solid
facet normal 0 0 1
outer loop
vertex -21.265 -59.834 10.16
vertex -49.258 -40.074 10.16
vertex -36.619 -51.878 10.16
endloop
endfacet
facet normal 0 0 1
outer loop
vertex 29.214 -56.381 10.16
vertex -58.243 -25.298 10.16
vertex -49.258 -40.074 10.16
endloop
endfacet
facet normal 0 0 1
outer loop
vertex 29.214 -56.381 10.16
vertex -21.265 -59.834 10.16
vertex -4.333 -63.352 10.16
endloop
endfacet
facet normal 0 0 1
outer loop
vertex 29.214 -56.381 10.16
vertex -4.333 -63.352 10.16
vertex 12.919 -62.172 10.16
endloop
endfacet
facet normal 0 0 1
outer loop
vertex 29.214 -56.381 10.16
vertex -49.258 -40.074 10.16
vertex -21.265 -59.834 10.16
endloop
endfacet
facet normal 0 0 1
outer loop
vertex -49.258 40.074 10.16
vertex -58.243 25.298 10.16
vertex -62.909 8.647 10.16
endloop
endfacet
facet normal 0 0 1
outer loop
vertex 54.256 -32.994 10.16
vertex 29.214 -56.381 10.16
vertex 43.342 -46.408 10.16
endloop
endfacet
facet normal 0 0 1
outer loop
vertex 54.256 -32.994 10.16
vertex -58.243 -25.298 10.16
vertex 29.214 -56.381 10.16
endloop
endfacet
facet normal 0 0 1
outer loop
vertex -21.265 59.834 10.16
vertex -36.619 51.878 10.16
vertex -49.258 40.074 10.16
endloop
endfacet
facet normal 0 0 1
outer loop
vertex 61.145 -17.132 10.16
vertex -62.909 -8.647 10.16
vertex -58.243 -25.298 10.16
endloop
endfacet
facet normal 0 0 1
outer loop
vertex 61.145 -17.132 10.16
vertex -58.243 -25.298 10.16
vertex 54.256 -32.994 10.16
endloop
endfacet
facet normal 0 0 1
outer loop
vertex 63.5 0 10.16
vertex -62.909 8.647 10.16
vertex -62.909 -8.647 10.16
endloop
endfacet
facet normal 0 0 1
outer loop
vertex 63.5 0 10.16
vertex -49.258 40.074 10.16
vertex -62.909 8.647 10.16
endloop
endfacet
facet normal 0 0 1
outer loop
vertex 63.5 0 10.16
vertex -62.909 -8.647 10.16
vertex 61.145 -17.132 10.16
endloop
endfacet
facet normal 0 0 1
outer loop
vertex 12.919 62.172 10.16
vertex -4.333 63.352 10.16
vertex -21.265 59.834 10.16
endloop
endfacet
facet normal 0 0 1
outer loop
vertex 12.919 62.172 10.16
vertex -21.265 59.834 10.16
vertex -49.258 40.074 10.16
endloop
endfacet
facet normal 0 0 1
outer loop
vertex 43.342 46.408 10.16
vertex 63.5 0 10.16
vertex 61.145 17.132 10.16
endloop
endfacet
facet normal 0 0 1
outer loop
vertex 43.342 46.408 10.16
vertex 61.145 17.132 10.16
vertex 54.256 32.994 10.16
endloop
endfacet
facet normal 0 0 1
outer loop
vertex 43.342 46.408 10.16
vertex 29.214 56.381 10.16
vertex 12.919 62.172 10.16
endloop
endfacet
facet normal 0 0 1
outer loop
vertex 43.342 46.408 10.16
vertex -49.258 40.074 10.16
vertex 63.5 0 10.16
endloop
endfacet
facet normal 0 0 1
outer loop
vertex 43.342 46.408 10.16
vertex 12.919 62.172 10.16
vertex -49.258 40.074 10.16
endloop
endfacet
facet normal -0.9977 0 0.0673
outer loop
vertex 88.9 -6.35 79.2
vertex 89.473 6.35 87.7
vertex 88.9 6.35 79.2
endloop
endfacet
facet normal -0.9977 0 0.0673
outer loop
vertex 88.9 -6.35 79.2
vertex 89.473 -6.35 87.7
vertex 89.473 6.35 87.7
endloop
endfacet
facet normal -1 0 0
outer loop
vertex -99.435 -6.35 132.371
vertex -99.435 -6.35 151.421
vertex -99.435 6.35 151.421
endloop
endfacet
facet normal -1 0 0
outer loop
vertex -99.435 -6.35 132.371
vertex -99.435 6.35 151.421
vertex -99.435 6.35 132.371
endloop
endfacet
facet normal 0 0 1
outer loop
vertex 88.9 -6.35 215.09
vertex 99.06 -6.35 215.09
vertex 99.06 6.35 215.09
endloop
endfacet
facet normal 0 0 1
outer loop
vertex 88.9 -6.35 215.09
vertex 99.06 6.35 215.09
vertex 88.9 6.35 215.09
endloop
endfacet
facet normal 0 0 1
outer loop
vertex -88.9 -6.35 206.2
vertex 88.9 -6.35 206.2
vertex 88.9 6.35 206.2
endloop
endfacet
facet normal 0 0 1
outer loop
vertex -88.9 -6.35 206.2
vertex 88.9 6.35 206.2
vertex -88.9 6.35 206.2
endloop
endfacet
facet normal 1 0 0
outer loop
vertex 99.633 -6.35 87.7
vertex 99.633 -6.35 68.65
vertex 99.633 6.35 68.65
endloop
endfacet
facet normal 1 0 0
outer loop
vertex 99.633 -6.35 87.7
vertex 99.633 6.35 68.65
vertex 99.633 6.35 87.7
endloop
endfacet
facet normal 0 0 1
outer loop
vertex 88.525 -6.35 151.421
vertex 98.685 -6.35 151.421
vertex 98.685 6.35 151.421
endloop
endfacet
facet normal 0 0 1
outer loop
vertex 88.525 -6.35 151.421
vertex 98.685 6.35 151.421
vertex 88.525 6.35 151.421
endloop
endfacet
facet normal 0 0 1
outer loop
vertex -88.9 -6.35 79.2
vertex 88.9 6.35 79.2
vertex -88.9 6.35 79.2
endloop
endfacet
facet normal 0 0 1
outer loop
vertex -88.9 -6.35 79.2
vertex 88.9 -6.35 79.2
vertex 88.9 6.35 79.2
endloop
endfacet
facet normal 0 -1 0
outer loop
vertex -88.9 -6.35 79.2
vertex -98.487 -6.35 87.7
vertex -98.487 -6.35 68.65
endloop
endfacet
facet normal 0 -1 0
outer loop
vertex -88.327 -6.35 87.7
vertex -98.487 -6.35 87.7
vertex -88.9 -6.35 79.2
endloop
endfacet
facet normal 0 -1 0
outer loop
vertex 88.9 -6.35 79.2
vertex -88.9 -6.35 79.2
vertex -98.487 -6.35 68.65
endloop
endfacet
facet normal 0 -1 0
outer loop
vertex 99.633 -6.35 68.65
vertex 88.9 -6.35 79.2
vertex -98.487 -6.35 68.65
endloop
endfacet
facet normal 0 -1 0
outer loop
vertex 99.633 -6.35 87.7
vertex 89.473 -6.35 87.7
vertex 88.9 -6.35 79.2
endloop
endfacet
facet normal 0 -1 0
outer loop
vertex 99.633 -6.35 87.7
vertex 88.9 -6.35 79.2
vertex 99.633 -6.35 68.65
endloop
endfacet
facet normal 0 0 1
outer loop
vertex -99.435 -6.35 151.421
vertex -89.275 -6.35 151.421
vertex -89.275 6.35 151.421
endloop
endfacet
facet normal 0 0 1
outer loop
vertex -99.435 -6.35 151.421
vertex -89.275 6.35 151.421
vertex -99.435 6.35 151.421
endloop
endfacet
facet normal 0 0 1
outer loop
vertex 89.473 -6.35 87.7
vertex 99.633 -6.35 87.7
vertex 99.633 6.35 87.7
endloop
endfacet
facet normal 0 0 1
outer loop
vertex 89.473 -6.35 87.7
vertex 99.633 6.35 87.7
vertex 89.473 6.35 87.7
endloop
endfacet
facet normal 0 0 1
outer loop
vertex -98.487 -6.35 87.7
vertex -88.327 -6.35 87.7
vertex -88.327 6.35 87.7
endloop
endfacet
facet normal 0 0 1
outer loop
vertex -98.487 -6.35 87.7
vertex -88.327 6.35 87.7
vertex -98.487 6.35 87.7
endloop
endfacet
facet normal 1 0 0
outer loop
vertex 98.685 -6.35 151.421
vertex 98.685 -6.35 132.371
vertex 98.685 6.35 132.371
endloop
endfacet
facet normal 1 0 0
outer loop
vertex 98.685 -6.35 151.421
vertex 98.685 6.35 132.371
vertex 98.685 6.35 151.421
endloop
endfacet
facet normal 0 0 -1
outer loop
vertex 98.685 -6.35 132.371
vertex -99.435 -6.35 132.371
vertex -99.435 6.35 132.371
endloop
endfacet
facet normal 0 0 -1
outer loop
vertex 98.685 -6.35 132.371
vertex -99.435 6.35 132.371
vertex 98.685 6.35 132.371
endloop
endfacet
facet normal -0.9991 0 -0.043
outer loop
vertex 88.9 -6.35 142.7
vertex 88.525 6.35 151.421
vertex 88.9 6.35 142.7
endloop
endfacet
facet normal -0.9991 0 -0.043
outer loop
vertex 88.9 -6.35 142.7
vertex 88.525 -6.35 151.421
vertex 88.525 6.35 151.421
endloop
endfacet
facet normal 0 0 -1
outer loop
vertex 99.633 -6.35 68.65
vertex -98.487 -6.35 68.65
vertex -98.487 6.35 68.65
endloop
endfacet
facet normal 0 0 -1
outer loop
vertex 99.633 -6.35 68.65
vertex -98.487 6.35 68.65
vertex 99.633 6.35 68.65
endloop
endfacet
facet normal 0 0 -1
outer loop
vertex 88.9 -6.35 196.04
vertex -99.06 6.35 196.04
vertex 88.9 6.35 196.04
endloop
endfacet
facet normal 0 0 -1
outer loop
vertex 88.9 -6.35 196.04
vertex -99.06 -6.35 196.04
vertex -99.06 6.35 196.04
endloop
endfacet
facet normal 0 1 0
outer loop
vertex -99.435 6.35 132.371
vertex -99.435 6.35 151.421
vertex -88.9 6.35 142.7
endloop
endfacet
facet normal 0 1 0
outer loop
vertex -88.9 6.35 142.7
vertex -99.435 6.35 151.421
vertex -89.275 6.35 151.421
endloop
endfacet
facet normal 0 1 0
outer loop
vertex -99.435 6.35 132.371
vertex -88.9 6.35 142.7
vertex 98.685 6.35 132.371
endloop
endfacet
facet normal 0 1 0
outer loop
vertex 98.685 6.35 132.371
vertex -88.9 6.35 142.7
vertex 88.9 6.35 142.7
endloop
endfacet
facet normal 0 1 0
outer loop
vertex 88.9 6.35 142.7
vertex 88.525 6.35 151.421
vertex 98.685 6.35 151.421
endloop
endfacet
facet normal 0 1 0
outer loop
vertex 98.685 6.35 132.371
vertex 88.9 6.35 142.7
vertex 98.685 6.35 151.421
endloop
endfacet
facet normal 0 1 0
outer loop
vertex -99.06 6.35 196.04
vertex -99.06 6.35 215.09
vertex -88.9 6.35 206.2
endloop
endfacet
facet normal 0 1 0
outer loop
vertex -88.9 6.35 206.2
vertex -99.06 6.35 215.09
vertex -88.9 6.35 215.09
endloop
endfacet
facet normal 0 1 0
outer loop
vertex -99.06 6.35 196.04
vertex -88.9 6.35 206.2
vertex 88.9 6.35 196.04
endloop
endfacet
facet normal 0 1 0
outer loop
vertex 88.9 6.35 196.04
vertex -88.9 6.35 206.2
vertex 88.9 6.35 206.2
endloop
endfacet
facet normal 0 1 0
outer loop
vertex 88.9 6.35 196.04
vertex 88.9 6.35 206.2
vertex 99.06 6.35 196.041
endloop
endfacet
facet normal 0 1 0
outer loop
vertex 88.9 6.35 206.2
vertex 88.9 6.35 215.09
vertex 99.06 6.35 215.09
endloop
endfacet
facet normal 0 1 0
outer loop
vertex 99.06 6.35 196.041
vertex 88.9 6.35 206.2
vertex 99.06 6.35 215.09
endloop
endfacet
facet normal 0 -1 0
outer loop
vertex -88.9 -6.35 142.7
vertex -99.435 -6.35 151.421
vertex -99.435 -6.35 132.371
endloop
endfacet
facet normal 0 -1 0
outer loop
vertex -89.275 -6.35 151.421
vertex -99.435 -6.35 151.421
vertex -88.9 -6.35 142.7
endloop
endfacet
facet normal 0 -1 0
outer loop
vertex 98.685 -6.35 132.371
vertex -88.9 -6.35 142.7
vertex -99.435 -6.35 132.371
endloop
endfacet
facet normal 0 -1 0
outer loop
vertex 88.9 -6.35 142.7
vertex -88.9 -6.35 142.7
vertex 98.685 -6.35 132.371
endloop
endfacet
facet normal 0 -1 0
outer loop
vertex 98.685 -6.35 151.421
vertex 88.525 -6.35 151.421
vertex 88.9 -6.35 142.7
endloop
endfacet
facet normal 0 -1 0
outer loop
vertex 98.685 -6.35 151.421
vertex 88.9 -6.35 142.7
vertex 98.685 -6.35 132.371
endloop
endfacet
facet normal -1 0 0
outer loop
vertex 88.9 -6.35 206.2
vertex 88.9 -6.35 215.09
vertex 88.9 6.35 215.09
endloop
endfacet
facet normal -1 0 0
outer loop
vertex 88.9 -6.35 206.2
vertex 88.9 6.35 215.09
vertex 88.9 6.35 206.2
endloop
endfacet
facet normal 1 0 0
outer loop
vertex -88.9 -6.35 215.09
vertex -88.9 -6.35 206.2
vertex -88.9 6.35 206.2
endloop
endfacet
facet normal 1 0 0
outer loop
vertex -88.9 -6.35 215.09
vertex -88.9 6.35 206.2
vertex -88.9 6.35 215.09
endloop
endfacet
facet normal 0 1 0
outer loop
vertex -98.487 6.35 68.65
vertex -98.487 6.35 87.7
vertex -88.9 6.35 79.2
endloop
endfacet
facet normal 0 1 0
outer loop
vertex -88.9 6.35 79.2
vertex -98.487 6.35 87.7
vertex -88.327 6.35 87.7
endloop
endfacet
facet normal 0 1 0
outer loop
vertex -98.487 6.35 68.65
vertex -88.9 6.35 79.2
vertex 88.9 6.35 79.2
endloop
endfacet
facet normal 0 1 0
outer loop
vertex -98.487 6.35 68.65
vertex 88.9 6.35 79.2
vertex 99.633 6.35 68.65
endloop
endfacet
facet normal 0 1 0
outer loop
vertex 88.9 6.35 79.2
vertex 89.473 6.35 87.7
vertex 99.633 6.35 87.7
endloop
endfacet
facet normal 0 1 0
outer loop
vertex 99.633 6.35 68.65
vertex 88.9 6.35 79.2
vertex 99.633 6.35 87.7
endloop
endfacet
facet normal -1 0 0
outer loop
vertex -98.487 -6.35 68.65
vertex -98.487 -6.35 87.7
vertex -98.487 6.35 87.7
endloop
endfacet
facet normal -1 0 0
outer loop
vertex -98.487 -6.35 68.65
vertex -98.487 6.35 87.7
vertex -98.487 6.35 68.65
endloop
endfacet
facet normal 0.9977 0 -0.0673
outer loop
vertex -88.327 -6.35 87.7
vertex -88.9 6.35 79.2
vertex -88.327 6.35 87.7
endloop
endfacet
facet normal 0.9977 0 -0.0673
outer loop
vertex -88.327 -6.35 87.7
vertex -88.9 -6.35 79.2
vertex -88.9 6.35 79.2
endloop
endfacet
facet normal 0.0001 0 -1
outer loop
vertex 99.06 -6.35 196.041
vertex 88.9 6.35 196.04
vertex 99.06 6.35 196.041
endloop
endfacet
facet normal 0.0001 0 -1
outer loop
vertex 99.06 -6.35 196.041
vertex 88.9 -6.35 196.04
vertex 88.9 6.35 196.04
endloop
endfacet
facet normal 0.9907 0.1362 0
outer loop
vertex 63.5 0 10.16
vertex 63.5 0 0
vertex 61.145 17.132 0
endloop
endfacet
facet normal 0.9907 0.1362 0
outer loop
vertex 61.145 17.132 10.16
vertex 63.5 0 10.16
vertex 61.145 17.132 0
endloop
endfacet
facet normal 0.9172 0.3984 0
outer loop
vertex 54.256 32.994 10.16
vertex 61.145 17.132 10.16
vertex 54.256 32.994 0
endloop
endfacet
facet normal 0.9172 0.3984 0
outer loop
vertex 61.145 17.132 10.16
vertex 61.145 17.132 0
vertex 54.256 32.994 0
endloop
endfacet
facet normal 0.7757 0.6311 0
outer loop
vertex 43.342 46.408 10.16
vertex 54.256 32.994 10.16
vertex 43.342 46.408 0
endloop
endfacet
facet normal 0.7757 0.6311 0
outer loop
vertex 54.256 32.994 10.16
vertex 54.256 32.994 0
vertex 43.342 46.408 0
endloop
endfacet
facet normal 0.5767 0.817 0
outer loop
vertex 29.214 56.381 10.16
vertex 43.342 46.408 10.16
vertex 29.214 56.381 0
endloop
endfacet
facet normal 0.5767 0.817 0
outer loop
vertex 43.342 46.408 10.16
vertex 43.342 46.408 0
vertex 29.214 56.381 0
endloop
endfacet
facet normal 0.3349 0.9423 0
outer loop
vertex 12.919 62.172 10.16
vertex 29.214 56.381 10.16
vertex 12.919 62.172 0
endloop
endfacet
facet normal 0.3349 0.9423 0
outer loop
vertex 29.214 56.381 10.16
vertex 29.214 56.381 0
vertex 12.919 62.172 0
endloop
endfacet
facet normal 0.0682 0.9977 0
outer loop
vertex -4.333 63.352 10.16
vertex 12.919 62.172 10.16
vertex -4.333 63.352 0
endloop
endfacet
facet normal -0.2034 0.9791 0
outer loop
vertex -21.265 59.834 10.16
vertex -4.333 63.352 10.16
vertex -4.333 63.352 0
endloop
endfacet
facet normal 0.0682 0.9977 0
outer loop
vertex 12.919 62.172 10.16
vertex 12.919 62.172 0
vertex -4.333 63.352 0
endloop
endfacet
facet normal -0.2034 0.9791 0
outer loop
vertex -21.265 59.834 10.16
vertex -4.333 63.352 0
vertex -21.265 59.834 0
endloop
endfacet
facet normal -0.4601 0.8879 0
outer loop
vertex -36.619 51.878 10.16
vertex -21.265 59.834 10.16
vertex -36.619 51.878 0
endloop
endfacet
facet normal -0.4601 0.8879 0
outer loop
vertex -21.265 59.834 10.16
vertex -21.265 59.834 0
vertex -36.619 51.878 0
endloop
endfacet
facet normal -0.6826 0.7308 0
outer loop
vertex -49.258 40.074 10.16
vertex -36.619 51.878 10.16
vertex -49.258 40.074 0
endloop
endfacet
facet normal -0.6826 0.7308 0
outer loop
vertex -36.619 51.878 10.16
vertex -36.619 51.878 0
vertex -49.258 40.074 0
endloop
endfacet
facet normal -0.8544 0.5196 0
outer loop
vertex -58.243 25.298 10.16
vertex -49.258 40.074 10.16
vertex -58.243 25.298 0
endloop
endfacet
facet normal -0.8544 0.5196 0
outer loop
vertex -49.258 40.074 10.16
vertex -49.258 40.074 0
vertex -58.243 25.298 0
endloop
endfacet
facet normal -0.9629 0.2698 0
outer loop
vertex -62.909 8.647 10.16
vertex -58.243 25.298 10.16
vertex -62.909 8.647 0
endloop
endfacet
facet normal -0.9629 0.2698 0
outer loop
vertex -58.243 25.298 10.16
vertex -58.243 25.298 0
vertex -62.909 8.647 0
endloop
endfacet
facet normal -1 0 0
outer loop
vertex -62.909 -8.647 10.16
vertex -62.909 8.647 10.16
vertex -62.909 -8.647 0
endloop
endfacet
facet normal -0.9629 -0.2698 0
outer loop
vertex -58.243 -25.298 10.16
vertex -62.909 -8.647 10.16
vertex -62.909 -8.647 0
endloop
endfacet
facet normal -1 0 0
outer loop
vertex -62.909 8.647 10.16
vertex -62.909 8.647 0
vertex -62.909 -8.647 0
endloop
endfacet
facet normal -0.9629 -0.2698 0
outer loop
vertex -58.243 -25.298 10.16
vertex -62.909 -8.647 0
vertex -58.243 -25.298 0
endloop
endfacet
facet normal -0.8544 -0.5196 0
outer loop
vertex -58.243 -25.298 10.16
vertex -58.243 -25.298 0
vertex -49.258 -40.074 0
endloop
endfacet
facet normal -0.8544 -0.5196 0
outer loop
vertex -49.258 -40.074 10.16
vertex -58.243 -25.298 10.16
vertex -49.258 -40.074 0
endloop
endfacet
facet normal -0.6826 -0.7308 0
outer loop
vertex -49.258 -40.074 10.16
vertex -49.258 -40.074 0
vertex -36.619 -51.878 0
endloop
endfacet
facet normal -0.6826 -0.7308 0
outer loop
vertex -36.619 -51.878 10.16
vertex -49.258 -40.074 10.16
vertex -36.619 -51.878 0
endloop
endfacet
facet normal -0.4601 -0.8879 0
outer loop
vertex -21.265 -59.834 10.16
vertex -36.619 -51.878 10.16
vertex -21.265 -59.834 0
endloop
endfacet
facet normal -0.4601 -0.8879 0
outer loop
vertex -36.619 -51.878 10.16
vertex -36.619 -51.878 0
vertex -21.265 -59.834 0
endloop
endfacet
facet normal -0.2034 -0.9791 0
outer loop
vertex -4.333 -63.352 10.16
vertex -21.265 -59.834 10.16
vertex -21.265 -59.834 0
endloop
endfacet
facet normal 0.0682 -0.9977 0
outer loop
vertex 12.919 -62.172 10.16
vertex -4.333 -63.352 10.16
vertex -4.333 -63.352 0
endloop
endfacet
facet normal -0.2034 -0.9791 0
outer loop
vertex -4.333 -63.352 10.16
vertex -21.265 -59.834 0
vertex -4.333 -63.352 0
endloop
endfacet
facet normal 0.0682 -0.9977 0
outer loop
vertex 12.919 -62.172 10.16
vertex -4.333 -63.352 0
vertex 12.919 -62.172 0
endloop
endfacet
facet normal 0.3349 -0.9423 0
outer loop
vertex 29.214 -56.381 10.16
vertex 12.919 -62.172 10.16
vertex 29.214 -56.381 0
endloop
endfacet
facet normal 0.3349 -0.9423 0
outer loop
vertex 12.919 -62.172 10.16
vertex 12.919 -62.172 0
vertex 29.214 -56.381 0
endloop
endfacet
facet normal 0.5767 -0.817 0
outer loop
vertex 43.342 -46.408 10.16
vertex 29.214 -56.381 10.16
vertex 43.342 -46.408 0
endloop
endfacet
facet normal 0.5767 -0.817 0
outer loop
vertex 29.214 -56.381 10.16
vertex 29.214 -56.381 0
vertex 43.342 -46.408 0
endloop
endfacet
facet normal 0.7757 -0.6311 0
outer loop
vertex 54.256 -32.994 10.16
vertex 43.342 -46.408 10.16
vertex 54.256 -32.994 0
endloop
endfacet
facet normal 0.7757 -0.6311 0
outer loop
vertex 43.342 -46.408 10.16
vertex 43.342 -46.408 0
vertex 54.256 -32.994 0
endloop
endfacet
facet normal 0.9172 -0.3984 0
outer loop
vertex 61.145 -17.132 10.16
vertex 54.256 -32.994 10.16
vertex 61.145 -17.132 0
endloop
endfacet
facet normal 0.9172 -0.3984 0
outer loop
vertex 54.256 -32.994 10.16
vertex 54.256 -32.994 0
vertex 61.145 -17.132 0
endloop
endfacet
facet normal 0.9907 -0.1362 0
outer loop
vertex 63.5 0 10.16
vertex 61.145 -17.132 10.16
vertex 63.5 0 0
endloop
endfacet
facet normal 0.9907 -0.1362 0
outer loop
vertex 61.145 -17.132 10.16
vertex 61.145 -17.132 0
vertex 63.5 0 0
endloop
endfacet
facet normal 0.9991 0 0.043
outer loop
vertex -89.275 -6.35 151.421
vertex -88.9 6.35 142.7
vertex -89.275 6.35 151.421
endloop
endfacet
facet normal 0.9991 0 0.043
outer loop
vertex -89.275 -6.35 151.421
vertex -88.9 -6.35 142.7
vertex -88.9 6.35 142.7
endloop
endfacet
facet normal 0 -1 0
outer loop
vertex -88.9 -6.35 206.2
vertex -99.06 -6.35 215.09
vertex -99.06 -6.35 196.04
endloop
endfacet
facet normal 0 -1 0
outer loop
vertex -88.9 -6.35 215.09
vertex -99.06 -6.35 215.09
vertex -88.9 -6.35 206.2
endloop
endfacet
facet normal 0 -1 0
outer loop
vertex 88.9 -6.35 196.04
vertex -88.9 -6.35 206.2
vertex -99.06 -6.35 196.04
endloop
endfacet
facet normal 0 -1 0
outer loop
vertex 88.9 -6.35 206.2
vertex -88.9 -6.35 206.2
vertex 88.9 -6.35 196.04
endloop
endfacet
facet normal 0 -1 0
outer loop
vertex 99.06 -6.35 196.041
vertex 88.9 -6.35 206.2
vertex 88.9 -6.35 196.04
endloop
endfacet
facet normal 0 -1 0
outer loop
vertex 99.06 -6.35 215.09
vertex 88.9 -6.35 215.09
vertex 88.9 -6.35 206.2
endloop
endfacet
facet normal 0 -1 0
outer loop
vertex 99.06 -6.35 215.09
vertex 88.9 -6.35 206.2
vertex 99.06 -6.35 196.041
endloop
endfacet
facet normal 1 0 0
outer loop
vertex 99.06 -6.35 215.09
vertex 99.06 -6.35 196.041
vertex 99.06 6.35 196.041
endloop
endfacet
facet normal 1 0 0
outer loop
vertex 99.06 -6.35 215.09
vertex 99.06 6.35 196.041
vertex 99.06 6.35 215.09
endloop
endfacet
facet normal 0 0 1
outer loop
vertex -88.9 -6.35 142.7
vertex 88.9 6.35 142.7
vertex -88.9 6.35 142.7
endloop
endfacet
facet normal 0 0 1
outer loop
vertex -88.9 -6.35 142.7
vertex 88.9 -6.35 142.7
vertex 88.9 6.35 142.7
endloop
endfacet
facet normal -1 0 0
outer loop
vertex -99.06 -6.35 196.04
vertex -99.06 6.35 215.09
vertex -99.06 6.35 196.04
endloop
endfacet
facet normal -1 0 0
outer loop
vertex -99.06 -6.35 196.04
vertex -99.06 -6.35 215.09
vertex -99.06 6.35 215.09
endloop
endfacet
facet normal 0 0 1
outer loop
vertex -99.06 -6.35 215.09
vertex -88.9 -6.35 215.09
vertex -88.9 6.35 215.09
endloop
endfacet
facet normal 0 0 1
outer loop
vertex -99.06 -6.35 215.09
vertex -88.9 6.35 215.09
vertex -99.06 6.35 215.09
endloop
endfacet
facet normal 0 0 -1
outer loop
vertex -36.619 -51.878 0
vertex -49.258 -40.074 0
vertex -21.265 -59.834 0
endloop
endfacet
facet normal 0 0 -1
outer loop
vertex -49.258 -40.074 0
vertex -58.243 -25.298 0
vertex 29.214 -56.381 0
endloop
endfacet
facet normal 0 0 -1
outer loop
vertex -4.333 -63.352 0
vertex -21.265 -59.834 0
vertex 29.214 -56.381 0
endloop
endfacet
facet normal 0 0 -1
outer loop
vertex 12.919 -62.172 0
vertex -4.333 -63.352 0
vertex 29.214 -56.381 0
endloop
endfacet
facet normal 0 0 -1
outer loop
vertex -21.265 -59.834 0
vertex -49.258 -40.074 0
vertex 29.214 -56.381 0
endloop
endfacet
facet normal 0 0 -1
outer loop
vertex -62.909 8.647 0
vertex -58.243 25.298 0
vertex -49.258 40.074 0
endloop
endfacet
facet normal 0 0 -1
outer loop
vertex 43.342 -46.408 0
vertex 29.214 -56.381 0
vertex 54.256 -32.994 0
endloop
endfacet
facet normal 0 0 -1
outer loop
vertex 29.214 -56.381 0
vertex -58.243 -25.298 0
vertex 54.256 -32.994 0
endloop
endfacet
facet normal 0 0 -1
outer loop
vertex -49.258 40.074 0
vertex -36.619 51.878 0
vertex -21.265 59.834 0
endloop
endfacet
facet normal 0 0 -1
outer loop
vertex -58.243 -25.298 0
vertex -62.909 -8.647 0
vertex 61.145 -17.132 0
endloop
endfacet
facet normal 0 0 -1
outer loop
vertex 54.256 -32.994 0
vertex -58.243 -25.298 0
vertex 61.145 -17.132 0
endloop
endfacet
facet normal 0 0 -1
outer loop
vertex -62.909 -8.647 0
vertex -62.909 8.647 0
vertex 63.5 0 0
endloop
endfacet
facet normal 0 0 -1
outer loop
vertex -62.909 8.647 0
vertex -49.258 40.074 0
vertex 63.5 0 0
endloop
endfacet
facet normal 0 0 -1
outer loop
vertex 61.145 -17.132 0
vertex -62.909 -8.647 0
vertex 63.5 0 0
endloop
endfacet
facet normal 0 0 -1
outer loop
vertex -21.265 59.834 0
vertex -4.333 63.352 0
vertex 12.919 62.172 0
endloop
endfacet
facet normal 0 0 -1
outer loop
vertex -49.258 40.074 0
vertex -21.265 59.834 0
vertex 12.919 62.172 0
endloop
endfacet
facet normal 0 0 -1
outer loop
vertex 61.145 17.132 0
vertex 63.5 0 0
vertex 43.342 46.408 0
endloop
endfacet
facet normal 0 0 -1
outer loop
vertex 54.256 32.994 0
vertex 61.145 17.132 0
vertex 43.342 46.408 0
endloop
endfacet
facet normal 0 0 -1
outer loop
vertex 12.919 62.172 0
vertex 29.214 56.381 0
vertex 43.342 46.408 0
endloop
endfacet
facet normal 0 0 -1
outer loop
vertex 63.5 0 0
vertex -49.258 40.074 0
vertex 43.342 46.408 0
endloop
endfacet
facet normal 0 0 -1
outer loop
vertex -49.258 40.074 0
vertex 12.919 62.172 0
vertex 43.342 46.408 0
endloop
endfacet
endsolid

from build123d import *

# Parameters (mm, degrees)
F0_R     = 63.5
F1_DEPTH = 10.16
F5_DEPTH = 6.35


# Not quite as in the source:
# - the program builds the solid bodies; features that only make, move or delete a surface that nothing else refers to are left out


with BuildPart() as f1:
    # F0 (on Top) → F1 (new body)
    with BuildSketch(Plane.XY):
        Circle(F0_R)
    extrude(amount=F1_DEPTH)


with BuildPart() as f5:
    # F4 (on Front) → F5 (new body, symmetric)
    with BuildSketch(Plane.XZ):
        Polygon((-88.3273622656, 68.6497017741), (0, 68.6497017741), (0, 74.1204561174), (0, 79.2004561174), (-88.9, 79.2004561174), (-88.3273622656, 87.6997017741), (-98.4873622656, 87.6997017741), (-98.4873622656, 68.6497017741), align=None)
        Polygon((0, 74.1204561174), (0, 68.6497017741), (0.5726377344, 68.6497017741), (89.4726377344, 68.6497017741), (99.6326377344, 68.6497017741), (99.6326377344, 87.6997017741), (89.4726377344, 87.6997017741), (88.9, 79.2004561174), (0, 79.2004561174), align=None)
    extrude(amount=F5_DEPTH, both=True)


with BuildPart() as f5b:
    # F4 (on Front) → F5, piece 2 (new body, symmetric)
    with BuildSketch(Plane.XZ):
        Polygon((-88.9, 196.0404561174), (0, 196.0404561174), (88.9, 196.0404561174), (99.06, 196.0408687592), (99.06, 215.0904561174), (88.9, 215.0904561174), (88.9, 206.2004561174), (0, 206.2004561174), (-88.9, 206.2004561174), (-88.9, 215.0904561174), (-99.0599915385, 215.0904561174), (-99.0599915385, 196.0404561174), align=None)
    extrude(amount=F5_DEPTH, both=True)


with BuildPart() as f5c:
    # F4 (on Front) → F5, piece 3 (new body, symmetric)
    with BuildSketch(Plane.XZ):
        Polygon((-0.3752847338, 132.3706507683), (0, 132.3706507683), (0, 137.6204561174), (0, 142.7004561174), (-88.9, 142.7004561174), (-89.2752847338, 151.4206507683), (-99.4352847338, 151.4206507683), (-99.4352847338, 132.3706507683), (-89.2752847338, 132.3706507683), align=None)
        Polygon((0, 137.6204561174), (0, 132.3706507683), (88.5247152662, 132.3706507683), (98.6847152662, 132.3706507683), (98.6847152662, 151.4206507683), (88.5247152662, 151.4206507683), (88.9, 142.7004561174), (0, 142.7004561174), align=None)
    extrude(amount=F5_DEPTH, both=True)


solid = Compound([f1.part, f5.part, f5b.part, f5c.part])
